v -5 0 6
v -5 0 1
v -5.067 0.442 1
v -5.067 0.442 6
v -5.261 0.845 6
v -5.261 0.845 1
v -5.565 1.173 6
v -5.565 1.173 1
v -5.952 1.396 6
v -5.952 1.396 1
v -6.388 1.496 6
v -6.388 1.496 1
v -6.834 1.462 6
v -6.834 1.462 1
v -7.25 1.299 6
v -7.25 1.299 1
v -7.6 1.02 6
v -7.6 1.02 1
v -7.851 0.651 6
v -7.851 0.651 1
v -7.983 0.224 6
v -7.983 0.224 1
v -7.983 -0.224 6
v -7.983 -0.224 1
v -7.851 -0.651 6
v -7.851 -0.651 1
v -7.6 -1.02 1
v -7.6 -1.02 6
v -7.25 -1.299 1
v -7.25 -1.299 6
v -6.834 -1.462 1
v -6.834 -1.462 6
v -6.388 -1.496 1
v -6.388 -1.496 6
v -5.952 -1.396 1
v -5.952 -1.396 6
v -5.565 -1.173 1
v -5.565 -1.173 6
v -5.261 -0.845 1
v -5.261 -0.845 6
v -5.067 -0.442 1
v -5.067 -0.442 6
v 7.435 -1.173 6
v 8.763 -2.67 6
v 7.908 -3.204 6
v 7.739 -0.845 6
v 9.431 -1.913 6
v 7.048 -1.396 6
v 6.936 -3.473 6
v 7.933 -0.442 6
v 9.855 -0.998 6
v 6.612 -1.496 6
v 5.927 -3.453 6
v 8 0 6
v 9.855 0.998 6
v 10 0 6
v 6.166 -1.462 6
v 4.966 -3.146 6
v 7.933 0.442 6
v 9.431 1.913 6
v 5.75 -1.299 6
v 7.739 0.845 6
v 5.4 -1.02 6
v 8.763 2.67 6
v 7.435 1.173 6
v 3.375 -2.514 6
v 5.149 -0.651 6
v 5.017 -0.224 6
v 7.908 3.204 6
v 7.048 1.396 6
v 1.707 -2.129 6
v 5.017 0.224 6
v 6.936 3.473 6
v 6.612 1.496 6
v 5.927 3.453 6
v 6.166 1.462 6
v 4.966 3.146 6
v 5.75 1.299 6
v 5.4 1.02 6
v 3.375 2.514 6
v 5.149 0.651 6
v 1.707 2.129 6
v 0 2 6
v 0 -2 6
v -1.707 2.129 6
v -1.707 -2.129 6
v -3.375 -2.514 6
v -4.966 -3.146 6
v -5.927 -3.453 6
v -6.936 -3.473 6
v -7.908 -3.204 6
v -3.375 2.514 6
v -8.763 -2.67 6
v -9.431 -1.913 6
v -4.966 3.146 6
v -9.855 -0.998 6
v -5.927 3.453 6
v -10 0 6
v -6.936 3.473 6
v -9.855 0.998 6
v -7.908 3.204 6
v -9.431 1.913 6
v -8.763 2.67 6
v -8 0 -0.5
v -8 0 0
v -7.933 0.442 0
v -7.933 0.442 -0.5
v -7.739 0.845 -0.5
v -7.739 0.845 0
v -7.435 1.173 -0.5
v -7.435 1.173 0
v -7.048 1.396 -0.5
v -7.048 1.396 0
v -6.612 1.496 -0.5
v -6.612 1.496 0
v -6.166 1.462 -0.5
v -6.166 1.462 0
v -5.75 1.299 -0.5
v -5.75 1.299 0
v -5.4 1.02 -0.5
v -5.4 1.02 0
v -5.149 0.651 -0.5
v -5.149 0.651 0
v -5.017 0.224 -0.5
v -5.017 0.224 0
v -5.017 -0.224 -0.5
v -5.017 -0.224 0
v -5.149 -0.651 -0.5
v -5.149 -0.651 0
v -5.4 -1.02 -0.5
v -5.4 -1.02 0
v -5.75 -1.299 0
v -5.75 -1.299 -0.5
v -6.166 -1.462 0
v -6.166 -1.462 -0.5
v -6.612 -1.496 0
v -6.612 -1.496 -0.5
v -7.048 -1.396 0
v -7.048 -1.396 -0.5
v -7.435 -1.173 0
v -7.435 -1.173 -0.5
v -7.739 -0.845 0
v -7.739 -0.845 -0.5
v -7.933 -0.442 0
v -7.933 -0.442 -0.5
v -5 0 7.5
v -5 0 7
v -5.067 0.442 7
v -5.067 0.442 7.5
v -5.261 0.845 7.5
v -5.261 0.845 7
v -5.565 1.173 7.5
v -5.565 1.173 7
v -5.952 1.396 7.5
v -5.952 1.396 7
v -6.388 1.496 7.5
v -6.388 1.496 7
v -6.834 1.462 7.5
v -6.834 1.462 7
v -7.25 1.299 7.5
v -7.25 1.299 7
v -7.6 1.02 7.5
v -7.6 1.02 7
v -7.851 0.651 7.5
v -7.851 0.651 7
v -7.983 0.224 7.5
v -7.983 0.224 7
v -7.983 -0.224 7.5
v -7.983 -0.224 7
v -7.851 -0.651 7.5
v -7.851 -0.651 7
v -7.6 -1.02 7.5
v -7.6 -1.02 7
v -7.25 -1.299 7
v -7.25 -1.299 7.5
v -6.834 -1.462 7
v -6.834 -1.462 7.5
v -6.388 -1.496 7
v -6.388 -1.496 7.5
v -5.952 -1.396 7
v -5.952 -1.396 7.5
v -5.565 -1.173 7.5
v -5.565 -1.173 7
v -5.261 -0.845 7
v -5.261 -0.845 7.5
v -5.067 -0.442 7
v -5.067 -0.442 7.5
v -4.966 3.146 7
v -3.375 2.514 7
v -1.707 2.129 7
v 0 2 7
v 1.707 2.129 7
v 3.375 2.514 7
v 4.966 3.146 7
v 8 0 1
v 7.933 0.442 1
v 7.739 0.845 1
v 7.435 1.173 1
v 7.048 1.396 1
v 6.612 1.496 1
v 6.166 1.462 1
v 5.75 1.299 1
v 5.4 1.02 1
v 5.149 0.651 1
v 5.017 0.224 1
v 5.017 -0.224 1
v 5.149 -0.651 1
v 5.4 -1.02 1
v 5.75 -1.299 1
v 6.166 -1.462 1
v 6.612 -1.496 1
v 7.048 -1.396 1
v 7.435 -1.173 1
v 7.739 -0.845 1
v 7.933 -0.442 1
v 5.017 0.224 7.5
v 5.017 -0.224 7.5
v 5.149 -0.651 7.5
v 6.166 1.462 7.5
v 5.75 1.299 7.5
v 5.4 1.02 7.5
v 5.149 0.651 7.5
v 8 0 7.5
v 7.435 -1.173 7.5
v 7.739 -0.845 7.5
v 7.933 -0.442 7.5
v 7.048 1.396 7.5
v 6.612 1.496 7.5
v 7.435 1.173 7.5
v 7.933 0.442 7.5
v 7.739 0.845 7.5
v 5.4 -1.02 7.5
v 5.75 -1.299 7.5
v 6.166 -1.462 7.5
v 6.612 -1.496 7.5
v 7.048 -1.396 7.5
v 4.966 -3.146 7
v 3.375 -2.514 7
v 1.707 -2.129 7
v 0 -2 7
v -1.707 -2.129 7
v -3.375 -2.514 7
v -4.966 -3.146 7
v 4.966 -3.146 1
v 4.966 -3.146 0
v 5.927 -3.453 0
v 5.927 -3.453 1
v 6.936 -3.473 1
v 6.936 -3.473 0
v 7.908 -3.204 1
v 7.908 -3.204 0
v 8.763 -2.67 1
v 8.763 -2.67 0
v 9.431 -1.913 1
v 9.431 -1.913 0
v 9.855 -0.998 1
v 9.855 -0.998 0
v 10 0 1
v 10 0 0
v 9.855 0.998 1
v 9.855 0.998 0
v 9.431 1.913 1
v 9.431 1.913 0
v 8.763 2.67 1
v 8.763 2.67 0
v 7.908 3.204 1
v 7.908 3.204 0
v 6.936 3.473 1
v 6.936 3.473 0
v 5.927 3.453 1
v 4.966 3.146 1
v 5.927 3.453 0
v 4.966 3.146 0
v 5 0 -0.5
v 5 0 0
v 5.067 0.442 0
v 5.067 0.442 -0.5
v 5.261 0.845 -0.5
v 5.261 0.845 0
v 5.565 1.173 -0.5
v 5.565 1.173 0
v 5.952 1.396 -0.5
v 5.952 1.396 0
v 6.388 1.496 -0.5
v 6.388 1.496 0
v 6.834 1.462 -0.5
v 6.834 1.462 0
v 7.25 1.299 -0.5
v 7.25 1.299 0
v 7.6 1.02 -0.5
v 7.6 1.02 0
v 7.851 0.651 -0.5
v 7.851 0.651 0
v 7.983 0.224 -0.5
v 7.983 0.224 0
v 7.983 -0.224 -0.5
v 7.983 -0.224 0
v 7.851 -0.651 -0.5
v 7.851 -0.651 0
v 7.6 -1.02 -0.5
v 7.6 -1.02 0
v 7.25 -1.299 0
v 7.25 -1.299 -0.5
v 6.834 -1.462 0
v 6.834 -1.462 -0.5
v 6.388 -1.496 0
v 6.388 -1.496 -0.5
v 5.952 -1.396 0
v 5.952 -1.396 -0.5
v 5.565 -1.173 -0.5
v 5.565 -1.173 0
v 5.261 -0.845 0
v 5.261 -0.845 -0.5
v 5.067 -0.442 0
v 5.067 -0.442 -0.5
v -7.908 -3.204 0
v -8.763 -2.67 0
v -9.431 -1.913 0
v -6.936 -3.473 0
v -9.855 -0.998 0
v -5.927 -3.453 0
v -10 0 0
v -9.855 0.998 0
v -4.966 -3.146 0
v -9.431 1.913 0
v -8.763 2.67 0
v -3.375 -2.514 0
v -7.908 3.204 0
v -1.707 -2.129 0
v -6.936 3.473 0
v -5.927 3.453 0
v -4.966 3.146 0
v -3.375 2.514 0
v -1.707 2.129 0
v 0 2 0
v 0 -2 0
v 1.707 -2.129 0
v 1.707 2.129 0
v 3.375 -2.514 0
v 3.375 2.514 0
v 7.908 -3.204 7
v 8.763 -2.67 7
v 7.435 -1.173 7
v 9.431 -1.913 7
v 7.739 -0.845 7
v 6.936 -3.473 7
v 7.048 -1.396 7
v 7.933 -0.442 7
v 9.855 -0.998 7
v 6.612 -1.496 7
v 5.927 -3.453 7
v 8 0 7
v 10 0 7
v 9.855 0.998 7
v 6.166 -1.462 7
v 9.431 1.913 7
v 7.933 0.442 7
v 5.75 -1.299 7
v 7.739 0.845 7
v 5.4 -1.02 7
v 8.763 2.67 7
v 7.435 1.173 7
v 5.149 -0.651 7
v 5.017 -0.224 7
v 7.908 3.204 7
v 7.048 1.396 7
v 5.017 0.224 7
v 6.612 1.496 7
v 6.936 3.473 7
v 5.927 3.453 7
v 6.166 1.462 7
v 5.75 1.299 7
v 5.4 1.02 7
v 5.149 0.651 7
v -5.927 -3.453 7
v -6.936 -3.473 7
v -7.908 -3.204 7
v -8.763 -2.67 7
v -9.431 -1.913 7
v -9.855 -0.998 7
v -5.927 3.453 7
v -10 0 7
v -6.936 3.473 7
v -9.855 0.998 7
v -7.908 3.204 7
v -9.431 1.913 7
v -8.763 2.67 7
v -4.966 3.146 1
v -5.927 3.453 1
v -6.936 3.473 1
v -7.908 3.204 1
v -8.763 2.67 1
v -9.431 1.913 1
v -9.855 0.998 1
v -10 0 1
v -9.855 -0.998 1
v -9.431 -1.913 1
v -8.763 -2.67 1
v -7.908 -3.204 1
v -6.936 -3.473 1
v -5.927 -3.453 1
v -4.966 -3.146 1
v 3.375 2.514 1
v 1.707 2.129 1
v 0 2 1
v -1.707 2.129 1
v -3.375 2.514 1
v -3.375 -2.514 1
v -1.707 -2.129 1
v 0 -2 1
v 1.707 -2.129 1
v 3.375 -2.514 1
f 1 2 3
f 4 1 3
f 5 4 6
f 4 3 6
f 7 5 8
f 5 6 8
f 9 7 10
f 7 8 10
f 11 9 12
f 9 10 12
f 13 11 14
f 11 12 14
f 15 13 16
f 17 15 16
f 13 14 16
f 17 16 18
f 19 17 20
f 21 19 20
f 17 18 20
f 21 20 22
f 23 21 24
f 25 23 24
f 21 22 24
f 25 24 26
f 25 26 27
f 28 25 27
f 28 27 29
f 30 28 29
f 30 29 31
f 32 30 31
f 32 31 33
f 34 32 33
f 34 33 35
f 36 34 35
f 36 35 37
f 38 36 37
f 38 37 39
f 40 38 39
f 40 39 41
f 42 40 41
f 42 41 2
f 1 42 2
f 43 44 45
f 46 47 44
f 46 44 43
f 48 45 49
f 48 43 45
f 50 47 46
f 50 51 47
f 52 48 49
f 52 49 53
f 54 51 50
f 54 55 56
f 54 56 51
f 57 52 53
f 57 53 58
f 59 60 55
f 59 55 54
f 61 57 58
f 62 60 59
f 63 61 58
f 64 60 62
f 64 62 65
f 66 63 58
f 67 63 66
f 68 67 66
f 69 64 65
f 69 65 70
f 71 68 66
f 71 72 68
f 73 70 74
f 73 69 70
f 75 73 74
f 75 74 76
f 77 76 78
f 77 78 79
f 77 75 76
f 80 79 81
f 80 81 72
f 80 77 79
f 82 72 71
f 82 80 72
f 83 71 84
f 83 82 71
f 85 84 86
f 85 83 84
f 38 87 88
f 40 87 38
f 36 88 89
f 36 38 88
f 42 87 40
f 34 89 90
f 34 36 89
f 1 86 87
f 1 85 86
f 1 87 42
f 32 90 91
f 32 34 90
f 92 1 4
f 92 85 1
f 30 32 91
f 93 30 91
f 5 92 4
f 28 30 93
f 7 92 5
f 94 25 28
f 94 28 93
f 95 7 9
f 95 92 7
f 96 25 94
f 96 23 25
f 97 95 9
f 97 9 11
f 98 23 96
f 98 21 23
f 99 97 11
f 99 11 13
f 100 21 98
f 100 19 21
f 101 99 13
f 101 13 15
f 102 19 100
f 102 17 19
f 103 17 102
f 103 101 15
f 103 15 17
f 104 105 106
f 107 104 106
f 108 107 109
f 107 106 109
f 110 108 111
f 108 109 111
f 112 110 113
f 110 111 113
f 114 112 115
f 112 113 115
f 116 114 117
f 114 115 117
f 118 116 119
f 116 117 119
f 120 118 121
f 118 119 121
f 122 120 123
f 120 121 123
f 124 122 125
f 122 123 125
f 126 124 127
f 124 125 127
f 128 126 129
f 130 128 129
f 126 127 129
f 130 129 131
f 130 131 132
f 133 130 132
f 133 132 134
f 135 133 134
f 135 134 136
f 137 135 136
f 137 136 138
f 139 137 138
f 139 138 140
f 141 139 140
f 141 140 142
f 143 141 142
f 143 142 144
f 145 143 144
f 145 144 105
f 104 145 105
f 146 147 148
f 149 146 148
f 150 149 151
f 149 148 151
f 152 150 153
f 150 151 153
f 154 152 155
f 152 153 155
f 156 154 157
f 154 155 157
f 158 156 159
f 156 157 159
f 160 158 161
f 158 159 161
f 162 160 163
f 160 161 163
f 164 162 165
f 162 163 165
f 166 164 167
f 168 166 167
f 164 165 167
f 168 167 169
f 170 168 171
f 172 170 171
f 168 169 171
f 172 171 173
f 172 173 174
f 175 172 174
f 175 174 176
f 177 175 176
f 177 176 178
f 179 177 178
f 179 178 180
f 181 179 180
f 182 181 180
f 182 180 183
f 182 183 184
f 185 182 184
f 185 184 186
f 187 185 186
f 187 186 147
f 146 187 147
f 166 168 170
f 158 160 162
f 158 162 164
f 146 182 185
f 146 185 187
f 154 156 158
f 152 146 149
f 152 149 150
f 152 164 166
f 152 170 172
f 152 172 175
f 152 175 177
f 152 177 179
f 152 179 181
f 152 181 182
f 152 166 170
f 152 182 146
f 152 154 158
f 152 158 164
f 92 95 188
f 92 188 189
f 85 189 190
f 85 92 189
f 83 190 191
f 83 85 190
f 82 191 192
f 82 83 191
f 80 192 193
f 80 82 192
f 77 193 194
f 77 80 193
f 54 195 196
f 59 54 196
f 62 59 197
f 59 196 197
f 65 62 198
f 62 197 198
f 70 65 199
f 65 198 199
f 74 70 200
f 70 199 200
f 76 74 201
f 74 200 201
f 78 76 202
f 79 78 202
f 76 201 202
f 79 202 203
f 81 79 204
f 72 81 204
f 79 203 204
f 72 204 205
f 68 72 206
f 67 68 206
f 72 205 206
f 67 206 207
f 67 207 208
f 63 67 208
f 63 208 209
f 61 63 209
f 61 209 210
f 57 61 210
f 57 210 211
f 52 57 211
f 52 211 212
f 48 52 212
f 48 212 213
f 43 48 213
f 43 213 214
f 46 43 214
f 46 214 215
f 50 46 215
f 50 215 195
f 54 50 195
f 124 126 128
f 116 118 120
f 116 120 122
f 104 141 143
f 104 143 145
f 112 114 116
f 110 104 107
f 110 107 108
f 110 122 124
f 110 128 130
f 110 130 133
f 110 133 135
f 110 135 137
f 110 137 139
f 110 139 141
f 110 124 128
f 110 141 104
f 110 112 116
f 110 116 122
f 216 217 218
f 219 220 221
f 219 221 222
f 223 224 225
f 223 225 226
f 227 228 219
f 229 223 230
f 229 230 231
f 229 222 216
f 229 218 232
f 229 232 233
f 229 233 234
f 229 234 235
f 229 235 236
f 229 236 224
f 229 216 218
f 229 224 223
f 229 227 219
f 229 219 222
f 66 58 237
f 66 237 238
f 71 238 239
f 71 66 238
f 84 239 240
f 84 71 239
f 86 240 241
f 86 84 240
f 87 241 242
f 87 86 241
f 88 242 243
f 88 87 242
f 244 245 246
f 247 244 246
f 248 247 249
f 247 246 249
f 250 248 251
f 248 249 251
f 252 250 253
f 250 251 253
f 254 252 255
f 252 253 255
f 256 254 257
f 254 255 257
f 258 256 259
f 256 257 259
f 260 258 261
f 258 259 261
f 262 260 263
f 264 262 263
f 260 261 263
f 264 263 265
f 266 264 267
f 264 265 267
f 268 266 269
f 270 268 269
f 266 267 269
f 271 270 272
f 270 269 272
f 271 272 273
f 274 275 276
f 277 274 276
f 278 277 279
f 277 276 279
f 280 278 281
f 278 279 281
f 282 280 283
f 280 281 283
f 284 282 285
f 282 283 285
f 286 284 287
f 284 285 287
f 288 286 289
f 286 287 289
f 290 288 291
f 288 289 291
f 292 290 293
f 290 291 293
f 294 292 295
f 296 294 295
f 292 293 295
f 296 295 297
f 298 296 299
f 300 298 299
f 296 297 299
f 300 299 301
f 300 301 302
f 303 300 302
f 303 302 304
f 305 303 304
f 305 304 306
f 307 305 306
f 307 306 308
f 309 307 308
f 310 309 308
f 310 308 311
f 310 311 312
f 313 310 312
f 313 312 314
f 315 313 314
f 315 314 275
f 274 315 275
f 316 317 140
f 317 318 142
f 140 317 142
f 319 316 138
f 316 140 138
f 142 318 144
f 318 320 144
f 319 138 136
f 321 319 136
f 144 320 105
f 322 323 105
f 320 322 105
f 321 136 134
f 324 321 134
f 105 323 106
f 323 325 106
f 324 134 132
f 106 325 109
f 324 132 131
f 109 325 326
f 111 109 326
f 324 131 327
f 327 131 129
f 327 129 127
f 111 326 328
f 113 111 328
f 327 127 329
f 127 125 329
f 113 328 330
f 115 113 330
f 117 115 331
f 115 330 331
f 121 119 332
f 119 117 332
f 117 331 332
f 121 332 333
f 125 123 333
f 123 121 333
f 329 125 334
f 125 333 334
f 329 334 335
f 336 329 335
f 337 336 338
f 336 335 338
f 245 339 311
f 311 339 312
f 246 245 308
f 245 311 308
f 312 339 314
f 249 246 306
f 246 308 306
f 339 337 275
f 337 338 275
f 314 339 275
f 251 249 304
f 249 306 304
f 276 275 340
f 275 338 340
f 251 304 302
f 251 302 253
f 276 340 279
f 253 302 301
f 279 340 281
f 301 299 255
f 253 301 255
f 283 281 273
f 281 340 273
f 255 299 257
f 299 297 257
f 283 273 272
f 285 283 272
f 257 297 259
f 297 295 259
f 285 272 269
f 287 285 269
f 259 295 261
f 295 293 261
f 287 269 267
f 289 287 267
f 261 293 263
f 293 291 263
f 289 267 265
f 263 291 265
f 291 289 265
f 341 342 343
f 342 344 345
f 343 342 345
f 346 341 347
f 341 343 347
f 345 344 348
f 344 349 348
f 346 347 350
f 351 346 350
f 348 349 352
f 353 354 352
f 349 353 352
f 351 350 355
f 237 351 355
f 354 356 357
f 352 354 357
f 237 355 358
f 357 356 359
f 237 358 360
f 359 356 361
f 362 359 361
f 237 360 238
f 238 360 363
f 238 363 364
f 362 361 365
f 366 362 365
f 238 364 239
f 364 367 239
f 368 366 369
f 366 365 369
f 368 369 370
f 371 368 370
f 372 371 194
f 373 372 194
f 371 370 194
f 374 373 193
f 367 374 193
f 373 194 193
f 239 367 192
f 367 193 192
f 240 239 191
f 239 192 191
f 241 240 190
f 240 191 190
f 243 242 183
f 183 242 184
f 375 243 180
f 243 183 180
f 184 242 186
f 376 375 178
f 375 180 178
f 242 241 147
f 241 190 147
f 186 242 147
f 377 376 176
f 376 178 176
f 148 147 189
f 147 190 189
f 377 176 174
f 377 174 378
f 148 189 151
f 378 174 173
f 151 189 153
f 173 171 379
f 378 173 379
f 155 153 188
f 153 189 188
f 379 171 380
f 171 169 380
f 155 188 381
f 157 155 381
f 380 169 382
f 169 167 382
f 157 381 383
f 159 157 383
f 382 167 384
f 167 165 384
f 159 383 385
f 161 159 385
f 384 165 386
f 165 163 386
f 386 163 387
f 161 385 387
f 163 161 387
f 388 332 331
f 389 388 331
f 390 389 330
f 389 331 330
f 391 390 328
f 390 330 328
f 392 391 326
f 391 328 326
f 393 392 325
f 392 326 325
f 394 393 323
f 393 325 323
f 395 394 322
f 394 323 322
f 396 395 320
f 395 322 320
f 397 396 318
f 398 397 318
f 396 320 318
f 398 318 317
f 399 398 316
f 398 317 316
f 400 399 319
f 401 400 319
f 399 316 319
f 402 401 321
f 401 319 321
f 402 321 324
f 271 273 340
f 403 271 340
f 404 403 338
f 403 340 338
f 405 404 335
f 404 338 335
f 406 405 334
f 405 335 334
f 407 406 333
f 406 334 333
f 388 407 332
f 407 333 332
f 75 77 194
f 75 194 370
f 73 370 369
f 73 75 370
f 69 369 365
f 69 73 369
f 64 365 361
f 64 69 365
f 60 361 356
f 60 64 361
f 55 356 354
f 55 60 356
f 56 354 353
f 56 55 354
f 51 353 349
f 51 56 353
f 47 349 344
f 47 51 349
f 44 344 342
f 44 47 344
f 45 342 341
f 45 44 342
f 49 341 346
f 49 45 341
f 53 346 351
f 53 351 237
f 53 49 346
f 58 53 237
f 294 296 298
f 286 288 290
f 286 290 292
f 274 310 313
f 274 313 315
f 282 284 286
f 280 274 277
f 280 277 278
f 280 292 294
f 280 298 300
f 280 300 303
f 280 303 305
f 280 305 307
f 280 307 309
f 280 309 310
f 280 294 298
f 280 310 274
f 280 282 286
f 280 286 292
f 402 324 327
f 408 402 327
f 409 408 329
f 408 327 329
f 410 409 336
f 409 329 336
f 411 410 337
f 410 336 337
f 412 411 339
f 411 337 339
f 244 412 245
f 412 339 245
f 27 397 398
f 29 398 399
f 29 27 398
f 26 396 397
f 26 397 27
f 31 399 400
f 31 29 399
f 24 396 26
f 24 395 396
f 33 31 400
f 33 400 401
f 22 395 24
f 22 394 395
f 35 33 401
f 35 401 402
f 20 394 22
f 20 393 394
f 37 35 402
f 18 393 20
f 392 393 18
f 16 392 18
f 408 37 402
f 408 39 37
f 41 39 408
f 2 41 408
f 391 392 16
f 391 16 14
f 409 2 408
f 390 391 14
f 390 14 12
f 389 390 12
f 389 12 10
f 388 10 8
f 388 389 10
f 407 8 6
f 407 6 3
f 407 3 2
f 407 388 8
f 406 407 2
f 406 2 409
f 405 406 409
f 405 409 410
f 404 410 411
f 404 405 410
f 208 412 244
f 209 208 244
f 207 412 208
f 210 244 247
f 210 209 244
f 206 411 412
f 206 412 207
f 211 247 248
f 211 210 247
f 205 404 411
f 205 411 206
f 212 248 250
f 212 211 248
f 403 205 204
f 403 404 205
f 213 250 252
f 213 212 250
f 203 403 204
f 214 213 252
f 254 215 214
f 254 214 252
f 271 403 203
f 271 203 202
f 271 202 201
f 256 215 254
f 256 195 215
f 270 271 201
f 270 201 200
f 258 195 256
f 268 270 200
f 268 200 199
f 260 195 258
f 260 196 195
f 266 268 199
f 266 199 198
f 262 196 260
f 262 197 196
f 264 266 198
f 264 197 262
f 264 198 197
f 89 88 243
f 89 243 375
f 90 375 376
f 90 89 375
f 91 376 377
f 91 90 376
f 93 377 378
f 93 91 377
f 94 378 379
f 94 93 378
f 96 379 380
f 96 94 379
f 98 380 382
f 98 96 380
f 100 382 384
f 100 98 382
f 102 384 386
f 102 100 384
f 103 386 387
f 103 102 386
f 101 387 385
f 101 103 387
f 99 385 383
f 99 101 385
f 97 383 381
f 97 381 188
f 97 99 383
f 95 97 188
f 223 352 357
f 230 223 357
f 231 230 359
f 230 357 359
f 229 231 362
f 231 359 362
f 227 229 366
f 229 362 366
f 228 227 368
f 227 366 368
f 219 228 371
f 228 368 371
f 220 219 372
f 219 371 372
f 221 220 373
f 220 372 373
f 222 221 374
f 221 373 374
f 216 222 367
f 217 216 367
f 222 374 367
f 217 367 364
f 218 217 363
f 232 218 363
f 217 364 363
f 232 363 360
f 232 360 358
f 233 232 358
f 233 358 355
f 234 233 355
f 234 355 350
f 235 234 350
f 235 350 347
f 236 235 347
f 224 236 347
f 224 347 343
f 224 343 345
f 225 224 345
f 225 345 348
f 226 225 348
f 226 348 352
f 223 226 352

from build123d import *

# Parameters (mm, degrees)
CROQUIS1_R                = 1.5
SALIENTE_EXTRUIR1_DEPTH   = 1
CROQUIS2_R                = 1.5
SALIENTE_EXTRUIR2_DEPTH   = 5
SALIENTE_EXTRUIR2_2_DEPTH = 5
CROQUIS3_R                = 1.5
SALIENTE_EXTRUIR4_DEPTH   = 1
CROQUIS4_R                = 1.5
SALIENTE_EXTRUIR5_DEPTH   = 1.5
CROQUIS5_R                = 1.5
SALIENTE_EXTRUIR6_DEPTH   = 1.5


with BuildPart() as part:
    # Croquis1 → Saliente-Extruir1 (new body)
    with BuildSketch(Plane.XY):
        with BuildLine():
            ThreePointArc((4.966292135, -3.146067416), (10, 0), (4.966292135, 3.146067416))
            ThreePointArc((4.966292135, 3.146067416), (0, 2), (-4.966292135, 3.146067416))
            ThreePointArc((-4.966292135, 3.146067416), (-10, 0), (-4.966292135, -3.146067416))
            ThreePointArc((-4.966292135, -3.146067416), (0, -2), (4.966292135, -3.146067416))
        make_face()
        with Locations((6.5, 0)):
            Circle(CROQUIS1_R, mode=Mode.SUBTRACT)
        with Locations((-6.5, 0)):
            Circle(CROQUIS1_R, mode=Mode.SUBTRACT)
    extrude(amount=SALIENTE_EXTRUIR1_DEPTH)



with BuildPart() as body_2:
    # Croquis2 → Saliente-Extruir2 (new body)
    with BuildSketch(Plane.XY.offset(1)):
        with Locations((-6.5, 0)):
            Circle(CROQUIS2_R)
    extrude(amount=SALIENTE_EXTRUIR2_DEPTH)



with BuildPart() as body_3:
    # Croquis2 → Saliente-Extruir2 2 (new body)
    with BuildSketch(Plane.XY.offset(1)):
        with Locations((6.5, 0)):
            Circle(CROQUIS2_R)
    extrude(amount=SALIENTE_EXTRUIR2_2_DEPTH)


with BuildPart() as body_4:
    # Croquis3 → Saliente-Extruir4 (new body)
    with BuildSketch(Plane.XY.offset(6)):
        with BuildLine():
            ThreePointArc((-4.966292135, 3.146067416), (0, 2), (4.966292135, 3.146067416))
            ThreePointArc((4.966292135, 3.146067416), (10, 0), (4.966292135, -3.146067416))
            ThreePointArc((4.966292135, -3.146067416), (0, -2), (-4.966292135, -3.146067416))
            ThreePointArc((-4.966292135, -3.146067416), (-10, 0), (-4.966292135, 3.146067416))
        make_face()
        with Locations((-6.5, 0)):
            Circle(CROQUIS3_R, mode=Mode.SUBTRACT)
        with Locations((6.5, 0)):
            Circle(CROQUIS3_R, mode=Mode.SUBTRACT)
    extrude(amount=SALIENTE_EXTRUIR4_DEPTH)


with BuildPart() as body_2_1:
    add(body_2.part)

    add(body_3.part)  # Saliente-Extruir5 merges body 3

    add(body_4.part)  # Saliente-Extruir5 merges body 4
    # Croquis4 → Saliente-Extruir5 (add)
    with BuildSketch(Plane.XY.offset(6)):
        with Locations((-6.5, 0)):
            Circle(CROQUIS4_R)
        with Locations((6.5, 0)):
            Circle(CROQUIS4_R)
    extrude(amount=SALIENTE_EXTRUIR5_DEPTH)


with BuildPart() as part_1:
    add(part.part)

    add(body_2_1.part)  # Saliente-Extruir6 merges body 2
    # Croquis5 → Saliente-Extruir6 (add)
    with BuildSketch(Plane(origin=(0, 0, 1), x_dir=(-1, 0, 0), z_dir=(0, 0, -1))):
        with Locations((-6.5, 0)):
            Circle(CROQUIS5_R)
        with Locations((6.5, 0)):
            Circle(CROQUIS5_R)
    extrude(amount=SALIENTE_EXTRUIR6_DEPTH)


solid = part_1.part
